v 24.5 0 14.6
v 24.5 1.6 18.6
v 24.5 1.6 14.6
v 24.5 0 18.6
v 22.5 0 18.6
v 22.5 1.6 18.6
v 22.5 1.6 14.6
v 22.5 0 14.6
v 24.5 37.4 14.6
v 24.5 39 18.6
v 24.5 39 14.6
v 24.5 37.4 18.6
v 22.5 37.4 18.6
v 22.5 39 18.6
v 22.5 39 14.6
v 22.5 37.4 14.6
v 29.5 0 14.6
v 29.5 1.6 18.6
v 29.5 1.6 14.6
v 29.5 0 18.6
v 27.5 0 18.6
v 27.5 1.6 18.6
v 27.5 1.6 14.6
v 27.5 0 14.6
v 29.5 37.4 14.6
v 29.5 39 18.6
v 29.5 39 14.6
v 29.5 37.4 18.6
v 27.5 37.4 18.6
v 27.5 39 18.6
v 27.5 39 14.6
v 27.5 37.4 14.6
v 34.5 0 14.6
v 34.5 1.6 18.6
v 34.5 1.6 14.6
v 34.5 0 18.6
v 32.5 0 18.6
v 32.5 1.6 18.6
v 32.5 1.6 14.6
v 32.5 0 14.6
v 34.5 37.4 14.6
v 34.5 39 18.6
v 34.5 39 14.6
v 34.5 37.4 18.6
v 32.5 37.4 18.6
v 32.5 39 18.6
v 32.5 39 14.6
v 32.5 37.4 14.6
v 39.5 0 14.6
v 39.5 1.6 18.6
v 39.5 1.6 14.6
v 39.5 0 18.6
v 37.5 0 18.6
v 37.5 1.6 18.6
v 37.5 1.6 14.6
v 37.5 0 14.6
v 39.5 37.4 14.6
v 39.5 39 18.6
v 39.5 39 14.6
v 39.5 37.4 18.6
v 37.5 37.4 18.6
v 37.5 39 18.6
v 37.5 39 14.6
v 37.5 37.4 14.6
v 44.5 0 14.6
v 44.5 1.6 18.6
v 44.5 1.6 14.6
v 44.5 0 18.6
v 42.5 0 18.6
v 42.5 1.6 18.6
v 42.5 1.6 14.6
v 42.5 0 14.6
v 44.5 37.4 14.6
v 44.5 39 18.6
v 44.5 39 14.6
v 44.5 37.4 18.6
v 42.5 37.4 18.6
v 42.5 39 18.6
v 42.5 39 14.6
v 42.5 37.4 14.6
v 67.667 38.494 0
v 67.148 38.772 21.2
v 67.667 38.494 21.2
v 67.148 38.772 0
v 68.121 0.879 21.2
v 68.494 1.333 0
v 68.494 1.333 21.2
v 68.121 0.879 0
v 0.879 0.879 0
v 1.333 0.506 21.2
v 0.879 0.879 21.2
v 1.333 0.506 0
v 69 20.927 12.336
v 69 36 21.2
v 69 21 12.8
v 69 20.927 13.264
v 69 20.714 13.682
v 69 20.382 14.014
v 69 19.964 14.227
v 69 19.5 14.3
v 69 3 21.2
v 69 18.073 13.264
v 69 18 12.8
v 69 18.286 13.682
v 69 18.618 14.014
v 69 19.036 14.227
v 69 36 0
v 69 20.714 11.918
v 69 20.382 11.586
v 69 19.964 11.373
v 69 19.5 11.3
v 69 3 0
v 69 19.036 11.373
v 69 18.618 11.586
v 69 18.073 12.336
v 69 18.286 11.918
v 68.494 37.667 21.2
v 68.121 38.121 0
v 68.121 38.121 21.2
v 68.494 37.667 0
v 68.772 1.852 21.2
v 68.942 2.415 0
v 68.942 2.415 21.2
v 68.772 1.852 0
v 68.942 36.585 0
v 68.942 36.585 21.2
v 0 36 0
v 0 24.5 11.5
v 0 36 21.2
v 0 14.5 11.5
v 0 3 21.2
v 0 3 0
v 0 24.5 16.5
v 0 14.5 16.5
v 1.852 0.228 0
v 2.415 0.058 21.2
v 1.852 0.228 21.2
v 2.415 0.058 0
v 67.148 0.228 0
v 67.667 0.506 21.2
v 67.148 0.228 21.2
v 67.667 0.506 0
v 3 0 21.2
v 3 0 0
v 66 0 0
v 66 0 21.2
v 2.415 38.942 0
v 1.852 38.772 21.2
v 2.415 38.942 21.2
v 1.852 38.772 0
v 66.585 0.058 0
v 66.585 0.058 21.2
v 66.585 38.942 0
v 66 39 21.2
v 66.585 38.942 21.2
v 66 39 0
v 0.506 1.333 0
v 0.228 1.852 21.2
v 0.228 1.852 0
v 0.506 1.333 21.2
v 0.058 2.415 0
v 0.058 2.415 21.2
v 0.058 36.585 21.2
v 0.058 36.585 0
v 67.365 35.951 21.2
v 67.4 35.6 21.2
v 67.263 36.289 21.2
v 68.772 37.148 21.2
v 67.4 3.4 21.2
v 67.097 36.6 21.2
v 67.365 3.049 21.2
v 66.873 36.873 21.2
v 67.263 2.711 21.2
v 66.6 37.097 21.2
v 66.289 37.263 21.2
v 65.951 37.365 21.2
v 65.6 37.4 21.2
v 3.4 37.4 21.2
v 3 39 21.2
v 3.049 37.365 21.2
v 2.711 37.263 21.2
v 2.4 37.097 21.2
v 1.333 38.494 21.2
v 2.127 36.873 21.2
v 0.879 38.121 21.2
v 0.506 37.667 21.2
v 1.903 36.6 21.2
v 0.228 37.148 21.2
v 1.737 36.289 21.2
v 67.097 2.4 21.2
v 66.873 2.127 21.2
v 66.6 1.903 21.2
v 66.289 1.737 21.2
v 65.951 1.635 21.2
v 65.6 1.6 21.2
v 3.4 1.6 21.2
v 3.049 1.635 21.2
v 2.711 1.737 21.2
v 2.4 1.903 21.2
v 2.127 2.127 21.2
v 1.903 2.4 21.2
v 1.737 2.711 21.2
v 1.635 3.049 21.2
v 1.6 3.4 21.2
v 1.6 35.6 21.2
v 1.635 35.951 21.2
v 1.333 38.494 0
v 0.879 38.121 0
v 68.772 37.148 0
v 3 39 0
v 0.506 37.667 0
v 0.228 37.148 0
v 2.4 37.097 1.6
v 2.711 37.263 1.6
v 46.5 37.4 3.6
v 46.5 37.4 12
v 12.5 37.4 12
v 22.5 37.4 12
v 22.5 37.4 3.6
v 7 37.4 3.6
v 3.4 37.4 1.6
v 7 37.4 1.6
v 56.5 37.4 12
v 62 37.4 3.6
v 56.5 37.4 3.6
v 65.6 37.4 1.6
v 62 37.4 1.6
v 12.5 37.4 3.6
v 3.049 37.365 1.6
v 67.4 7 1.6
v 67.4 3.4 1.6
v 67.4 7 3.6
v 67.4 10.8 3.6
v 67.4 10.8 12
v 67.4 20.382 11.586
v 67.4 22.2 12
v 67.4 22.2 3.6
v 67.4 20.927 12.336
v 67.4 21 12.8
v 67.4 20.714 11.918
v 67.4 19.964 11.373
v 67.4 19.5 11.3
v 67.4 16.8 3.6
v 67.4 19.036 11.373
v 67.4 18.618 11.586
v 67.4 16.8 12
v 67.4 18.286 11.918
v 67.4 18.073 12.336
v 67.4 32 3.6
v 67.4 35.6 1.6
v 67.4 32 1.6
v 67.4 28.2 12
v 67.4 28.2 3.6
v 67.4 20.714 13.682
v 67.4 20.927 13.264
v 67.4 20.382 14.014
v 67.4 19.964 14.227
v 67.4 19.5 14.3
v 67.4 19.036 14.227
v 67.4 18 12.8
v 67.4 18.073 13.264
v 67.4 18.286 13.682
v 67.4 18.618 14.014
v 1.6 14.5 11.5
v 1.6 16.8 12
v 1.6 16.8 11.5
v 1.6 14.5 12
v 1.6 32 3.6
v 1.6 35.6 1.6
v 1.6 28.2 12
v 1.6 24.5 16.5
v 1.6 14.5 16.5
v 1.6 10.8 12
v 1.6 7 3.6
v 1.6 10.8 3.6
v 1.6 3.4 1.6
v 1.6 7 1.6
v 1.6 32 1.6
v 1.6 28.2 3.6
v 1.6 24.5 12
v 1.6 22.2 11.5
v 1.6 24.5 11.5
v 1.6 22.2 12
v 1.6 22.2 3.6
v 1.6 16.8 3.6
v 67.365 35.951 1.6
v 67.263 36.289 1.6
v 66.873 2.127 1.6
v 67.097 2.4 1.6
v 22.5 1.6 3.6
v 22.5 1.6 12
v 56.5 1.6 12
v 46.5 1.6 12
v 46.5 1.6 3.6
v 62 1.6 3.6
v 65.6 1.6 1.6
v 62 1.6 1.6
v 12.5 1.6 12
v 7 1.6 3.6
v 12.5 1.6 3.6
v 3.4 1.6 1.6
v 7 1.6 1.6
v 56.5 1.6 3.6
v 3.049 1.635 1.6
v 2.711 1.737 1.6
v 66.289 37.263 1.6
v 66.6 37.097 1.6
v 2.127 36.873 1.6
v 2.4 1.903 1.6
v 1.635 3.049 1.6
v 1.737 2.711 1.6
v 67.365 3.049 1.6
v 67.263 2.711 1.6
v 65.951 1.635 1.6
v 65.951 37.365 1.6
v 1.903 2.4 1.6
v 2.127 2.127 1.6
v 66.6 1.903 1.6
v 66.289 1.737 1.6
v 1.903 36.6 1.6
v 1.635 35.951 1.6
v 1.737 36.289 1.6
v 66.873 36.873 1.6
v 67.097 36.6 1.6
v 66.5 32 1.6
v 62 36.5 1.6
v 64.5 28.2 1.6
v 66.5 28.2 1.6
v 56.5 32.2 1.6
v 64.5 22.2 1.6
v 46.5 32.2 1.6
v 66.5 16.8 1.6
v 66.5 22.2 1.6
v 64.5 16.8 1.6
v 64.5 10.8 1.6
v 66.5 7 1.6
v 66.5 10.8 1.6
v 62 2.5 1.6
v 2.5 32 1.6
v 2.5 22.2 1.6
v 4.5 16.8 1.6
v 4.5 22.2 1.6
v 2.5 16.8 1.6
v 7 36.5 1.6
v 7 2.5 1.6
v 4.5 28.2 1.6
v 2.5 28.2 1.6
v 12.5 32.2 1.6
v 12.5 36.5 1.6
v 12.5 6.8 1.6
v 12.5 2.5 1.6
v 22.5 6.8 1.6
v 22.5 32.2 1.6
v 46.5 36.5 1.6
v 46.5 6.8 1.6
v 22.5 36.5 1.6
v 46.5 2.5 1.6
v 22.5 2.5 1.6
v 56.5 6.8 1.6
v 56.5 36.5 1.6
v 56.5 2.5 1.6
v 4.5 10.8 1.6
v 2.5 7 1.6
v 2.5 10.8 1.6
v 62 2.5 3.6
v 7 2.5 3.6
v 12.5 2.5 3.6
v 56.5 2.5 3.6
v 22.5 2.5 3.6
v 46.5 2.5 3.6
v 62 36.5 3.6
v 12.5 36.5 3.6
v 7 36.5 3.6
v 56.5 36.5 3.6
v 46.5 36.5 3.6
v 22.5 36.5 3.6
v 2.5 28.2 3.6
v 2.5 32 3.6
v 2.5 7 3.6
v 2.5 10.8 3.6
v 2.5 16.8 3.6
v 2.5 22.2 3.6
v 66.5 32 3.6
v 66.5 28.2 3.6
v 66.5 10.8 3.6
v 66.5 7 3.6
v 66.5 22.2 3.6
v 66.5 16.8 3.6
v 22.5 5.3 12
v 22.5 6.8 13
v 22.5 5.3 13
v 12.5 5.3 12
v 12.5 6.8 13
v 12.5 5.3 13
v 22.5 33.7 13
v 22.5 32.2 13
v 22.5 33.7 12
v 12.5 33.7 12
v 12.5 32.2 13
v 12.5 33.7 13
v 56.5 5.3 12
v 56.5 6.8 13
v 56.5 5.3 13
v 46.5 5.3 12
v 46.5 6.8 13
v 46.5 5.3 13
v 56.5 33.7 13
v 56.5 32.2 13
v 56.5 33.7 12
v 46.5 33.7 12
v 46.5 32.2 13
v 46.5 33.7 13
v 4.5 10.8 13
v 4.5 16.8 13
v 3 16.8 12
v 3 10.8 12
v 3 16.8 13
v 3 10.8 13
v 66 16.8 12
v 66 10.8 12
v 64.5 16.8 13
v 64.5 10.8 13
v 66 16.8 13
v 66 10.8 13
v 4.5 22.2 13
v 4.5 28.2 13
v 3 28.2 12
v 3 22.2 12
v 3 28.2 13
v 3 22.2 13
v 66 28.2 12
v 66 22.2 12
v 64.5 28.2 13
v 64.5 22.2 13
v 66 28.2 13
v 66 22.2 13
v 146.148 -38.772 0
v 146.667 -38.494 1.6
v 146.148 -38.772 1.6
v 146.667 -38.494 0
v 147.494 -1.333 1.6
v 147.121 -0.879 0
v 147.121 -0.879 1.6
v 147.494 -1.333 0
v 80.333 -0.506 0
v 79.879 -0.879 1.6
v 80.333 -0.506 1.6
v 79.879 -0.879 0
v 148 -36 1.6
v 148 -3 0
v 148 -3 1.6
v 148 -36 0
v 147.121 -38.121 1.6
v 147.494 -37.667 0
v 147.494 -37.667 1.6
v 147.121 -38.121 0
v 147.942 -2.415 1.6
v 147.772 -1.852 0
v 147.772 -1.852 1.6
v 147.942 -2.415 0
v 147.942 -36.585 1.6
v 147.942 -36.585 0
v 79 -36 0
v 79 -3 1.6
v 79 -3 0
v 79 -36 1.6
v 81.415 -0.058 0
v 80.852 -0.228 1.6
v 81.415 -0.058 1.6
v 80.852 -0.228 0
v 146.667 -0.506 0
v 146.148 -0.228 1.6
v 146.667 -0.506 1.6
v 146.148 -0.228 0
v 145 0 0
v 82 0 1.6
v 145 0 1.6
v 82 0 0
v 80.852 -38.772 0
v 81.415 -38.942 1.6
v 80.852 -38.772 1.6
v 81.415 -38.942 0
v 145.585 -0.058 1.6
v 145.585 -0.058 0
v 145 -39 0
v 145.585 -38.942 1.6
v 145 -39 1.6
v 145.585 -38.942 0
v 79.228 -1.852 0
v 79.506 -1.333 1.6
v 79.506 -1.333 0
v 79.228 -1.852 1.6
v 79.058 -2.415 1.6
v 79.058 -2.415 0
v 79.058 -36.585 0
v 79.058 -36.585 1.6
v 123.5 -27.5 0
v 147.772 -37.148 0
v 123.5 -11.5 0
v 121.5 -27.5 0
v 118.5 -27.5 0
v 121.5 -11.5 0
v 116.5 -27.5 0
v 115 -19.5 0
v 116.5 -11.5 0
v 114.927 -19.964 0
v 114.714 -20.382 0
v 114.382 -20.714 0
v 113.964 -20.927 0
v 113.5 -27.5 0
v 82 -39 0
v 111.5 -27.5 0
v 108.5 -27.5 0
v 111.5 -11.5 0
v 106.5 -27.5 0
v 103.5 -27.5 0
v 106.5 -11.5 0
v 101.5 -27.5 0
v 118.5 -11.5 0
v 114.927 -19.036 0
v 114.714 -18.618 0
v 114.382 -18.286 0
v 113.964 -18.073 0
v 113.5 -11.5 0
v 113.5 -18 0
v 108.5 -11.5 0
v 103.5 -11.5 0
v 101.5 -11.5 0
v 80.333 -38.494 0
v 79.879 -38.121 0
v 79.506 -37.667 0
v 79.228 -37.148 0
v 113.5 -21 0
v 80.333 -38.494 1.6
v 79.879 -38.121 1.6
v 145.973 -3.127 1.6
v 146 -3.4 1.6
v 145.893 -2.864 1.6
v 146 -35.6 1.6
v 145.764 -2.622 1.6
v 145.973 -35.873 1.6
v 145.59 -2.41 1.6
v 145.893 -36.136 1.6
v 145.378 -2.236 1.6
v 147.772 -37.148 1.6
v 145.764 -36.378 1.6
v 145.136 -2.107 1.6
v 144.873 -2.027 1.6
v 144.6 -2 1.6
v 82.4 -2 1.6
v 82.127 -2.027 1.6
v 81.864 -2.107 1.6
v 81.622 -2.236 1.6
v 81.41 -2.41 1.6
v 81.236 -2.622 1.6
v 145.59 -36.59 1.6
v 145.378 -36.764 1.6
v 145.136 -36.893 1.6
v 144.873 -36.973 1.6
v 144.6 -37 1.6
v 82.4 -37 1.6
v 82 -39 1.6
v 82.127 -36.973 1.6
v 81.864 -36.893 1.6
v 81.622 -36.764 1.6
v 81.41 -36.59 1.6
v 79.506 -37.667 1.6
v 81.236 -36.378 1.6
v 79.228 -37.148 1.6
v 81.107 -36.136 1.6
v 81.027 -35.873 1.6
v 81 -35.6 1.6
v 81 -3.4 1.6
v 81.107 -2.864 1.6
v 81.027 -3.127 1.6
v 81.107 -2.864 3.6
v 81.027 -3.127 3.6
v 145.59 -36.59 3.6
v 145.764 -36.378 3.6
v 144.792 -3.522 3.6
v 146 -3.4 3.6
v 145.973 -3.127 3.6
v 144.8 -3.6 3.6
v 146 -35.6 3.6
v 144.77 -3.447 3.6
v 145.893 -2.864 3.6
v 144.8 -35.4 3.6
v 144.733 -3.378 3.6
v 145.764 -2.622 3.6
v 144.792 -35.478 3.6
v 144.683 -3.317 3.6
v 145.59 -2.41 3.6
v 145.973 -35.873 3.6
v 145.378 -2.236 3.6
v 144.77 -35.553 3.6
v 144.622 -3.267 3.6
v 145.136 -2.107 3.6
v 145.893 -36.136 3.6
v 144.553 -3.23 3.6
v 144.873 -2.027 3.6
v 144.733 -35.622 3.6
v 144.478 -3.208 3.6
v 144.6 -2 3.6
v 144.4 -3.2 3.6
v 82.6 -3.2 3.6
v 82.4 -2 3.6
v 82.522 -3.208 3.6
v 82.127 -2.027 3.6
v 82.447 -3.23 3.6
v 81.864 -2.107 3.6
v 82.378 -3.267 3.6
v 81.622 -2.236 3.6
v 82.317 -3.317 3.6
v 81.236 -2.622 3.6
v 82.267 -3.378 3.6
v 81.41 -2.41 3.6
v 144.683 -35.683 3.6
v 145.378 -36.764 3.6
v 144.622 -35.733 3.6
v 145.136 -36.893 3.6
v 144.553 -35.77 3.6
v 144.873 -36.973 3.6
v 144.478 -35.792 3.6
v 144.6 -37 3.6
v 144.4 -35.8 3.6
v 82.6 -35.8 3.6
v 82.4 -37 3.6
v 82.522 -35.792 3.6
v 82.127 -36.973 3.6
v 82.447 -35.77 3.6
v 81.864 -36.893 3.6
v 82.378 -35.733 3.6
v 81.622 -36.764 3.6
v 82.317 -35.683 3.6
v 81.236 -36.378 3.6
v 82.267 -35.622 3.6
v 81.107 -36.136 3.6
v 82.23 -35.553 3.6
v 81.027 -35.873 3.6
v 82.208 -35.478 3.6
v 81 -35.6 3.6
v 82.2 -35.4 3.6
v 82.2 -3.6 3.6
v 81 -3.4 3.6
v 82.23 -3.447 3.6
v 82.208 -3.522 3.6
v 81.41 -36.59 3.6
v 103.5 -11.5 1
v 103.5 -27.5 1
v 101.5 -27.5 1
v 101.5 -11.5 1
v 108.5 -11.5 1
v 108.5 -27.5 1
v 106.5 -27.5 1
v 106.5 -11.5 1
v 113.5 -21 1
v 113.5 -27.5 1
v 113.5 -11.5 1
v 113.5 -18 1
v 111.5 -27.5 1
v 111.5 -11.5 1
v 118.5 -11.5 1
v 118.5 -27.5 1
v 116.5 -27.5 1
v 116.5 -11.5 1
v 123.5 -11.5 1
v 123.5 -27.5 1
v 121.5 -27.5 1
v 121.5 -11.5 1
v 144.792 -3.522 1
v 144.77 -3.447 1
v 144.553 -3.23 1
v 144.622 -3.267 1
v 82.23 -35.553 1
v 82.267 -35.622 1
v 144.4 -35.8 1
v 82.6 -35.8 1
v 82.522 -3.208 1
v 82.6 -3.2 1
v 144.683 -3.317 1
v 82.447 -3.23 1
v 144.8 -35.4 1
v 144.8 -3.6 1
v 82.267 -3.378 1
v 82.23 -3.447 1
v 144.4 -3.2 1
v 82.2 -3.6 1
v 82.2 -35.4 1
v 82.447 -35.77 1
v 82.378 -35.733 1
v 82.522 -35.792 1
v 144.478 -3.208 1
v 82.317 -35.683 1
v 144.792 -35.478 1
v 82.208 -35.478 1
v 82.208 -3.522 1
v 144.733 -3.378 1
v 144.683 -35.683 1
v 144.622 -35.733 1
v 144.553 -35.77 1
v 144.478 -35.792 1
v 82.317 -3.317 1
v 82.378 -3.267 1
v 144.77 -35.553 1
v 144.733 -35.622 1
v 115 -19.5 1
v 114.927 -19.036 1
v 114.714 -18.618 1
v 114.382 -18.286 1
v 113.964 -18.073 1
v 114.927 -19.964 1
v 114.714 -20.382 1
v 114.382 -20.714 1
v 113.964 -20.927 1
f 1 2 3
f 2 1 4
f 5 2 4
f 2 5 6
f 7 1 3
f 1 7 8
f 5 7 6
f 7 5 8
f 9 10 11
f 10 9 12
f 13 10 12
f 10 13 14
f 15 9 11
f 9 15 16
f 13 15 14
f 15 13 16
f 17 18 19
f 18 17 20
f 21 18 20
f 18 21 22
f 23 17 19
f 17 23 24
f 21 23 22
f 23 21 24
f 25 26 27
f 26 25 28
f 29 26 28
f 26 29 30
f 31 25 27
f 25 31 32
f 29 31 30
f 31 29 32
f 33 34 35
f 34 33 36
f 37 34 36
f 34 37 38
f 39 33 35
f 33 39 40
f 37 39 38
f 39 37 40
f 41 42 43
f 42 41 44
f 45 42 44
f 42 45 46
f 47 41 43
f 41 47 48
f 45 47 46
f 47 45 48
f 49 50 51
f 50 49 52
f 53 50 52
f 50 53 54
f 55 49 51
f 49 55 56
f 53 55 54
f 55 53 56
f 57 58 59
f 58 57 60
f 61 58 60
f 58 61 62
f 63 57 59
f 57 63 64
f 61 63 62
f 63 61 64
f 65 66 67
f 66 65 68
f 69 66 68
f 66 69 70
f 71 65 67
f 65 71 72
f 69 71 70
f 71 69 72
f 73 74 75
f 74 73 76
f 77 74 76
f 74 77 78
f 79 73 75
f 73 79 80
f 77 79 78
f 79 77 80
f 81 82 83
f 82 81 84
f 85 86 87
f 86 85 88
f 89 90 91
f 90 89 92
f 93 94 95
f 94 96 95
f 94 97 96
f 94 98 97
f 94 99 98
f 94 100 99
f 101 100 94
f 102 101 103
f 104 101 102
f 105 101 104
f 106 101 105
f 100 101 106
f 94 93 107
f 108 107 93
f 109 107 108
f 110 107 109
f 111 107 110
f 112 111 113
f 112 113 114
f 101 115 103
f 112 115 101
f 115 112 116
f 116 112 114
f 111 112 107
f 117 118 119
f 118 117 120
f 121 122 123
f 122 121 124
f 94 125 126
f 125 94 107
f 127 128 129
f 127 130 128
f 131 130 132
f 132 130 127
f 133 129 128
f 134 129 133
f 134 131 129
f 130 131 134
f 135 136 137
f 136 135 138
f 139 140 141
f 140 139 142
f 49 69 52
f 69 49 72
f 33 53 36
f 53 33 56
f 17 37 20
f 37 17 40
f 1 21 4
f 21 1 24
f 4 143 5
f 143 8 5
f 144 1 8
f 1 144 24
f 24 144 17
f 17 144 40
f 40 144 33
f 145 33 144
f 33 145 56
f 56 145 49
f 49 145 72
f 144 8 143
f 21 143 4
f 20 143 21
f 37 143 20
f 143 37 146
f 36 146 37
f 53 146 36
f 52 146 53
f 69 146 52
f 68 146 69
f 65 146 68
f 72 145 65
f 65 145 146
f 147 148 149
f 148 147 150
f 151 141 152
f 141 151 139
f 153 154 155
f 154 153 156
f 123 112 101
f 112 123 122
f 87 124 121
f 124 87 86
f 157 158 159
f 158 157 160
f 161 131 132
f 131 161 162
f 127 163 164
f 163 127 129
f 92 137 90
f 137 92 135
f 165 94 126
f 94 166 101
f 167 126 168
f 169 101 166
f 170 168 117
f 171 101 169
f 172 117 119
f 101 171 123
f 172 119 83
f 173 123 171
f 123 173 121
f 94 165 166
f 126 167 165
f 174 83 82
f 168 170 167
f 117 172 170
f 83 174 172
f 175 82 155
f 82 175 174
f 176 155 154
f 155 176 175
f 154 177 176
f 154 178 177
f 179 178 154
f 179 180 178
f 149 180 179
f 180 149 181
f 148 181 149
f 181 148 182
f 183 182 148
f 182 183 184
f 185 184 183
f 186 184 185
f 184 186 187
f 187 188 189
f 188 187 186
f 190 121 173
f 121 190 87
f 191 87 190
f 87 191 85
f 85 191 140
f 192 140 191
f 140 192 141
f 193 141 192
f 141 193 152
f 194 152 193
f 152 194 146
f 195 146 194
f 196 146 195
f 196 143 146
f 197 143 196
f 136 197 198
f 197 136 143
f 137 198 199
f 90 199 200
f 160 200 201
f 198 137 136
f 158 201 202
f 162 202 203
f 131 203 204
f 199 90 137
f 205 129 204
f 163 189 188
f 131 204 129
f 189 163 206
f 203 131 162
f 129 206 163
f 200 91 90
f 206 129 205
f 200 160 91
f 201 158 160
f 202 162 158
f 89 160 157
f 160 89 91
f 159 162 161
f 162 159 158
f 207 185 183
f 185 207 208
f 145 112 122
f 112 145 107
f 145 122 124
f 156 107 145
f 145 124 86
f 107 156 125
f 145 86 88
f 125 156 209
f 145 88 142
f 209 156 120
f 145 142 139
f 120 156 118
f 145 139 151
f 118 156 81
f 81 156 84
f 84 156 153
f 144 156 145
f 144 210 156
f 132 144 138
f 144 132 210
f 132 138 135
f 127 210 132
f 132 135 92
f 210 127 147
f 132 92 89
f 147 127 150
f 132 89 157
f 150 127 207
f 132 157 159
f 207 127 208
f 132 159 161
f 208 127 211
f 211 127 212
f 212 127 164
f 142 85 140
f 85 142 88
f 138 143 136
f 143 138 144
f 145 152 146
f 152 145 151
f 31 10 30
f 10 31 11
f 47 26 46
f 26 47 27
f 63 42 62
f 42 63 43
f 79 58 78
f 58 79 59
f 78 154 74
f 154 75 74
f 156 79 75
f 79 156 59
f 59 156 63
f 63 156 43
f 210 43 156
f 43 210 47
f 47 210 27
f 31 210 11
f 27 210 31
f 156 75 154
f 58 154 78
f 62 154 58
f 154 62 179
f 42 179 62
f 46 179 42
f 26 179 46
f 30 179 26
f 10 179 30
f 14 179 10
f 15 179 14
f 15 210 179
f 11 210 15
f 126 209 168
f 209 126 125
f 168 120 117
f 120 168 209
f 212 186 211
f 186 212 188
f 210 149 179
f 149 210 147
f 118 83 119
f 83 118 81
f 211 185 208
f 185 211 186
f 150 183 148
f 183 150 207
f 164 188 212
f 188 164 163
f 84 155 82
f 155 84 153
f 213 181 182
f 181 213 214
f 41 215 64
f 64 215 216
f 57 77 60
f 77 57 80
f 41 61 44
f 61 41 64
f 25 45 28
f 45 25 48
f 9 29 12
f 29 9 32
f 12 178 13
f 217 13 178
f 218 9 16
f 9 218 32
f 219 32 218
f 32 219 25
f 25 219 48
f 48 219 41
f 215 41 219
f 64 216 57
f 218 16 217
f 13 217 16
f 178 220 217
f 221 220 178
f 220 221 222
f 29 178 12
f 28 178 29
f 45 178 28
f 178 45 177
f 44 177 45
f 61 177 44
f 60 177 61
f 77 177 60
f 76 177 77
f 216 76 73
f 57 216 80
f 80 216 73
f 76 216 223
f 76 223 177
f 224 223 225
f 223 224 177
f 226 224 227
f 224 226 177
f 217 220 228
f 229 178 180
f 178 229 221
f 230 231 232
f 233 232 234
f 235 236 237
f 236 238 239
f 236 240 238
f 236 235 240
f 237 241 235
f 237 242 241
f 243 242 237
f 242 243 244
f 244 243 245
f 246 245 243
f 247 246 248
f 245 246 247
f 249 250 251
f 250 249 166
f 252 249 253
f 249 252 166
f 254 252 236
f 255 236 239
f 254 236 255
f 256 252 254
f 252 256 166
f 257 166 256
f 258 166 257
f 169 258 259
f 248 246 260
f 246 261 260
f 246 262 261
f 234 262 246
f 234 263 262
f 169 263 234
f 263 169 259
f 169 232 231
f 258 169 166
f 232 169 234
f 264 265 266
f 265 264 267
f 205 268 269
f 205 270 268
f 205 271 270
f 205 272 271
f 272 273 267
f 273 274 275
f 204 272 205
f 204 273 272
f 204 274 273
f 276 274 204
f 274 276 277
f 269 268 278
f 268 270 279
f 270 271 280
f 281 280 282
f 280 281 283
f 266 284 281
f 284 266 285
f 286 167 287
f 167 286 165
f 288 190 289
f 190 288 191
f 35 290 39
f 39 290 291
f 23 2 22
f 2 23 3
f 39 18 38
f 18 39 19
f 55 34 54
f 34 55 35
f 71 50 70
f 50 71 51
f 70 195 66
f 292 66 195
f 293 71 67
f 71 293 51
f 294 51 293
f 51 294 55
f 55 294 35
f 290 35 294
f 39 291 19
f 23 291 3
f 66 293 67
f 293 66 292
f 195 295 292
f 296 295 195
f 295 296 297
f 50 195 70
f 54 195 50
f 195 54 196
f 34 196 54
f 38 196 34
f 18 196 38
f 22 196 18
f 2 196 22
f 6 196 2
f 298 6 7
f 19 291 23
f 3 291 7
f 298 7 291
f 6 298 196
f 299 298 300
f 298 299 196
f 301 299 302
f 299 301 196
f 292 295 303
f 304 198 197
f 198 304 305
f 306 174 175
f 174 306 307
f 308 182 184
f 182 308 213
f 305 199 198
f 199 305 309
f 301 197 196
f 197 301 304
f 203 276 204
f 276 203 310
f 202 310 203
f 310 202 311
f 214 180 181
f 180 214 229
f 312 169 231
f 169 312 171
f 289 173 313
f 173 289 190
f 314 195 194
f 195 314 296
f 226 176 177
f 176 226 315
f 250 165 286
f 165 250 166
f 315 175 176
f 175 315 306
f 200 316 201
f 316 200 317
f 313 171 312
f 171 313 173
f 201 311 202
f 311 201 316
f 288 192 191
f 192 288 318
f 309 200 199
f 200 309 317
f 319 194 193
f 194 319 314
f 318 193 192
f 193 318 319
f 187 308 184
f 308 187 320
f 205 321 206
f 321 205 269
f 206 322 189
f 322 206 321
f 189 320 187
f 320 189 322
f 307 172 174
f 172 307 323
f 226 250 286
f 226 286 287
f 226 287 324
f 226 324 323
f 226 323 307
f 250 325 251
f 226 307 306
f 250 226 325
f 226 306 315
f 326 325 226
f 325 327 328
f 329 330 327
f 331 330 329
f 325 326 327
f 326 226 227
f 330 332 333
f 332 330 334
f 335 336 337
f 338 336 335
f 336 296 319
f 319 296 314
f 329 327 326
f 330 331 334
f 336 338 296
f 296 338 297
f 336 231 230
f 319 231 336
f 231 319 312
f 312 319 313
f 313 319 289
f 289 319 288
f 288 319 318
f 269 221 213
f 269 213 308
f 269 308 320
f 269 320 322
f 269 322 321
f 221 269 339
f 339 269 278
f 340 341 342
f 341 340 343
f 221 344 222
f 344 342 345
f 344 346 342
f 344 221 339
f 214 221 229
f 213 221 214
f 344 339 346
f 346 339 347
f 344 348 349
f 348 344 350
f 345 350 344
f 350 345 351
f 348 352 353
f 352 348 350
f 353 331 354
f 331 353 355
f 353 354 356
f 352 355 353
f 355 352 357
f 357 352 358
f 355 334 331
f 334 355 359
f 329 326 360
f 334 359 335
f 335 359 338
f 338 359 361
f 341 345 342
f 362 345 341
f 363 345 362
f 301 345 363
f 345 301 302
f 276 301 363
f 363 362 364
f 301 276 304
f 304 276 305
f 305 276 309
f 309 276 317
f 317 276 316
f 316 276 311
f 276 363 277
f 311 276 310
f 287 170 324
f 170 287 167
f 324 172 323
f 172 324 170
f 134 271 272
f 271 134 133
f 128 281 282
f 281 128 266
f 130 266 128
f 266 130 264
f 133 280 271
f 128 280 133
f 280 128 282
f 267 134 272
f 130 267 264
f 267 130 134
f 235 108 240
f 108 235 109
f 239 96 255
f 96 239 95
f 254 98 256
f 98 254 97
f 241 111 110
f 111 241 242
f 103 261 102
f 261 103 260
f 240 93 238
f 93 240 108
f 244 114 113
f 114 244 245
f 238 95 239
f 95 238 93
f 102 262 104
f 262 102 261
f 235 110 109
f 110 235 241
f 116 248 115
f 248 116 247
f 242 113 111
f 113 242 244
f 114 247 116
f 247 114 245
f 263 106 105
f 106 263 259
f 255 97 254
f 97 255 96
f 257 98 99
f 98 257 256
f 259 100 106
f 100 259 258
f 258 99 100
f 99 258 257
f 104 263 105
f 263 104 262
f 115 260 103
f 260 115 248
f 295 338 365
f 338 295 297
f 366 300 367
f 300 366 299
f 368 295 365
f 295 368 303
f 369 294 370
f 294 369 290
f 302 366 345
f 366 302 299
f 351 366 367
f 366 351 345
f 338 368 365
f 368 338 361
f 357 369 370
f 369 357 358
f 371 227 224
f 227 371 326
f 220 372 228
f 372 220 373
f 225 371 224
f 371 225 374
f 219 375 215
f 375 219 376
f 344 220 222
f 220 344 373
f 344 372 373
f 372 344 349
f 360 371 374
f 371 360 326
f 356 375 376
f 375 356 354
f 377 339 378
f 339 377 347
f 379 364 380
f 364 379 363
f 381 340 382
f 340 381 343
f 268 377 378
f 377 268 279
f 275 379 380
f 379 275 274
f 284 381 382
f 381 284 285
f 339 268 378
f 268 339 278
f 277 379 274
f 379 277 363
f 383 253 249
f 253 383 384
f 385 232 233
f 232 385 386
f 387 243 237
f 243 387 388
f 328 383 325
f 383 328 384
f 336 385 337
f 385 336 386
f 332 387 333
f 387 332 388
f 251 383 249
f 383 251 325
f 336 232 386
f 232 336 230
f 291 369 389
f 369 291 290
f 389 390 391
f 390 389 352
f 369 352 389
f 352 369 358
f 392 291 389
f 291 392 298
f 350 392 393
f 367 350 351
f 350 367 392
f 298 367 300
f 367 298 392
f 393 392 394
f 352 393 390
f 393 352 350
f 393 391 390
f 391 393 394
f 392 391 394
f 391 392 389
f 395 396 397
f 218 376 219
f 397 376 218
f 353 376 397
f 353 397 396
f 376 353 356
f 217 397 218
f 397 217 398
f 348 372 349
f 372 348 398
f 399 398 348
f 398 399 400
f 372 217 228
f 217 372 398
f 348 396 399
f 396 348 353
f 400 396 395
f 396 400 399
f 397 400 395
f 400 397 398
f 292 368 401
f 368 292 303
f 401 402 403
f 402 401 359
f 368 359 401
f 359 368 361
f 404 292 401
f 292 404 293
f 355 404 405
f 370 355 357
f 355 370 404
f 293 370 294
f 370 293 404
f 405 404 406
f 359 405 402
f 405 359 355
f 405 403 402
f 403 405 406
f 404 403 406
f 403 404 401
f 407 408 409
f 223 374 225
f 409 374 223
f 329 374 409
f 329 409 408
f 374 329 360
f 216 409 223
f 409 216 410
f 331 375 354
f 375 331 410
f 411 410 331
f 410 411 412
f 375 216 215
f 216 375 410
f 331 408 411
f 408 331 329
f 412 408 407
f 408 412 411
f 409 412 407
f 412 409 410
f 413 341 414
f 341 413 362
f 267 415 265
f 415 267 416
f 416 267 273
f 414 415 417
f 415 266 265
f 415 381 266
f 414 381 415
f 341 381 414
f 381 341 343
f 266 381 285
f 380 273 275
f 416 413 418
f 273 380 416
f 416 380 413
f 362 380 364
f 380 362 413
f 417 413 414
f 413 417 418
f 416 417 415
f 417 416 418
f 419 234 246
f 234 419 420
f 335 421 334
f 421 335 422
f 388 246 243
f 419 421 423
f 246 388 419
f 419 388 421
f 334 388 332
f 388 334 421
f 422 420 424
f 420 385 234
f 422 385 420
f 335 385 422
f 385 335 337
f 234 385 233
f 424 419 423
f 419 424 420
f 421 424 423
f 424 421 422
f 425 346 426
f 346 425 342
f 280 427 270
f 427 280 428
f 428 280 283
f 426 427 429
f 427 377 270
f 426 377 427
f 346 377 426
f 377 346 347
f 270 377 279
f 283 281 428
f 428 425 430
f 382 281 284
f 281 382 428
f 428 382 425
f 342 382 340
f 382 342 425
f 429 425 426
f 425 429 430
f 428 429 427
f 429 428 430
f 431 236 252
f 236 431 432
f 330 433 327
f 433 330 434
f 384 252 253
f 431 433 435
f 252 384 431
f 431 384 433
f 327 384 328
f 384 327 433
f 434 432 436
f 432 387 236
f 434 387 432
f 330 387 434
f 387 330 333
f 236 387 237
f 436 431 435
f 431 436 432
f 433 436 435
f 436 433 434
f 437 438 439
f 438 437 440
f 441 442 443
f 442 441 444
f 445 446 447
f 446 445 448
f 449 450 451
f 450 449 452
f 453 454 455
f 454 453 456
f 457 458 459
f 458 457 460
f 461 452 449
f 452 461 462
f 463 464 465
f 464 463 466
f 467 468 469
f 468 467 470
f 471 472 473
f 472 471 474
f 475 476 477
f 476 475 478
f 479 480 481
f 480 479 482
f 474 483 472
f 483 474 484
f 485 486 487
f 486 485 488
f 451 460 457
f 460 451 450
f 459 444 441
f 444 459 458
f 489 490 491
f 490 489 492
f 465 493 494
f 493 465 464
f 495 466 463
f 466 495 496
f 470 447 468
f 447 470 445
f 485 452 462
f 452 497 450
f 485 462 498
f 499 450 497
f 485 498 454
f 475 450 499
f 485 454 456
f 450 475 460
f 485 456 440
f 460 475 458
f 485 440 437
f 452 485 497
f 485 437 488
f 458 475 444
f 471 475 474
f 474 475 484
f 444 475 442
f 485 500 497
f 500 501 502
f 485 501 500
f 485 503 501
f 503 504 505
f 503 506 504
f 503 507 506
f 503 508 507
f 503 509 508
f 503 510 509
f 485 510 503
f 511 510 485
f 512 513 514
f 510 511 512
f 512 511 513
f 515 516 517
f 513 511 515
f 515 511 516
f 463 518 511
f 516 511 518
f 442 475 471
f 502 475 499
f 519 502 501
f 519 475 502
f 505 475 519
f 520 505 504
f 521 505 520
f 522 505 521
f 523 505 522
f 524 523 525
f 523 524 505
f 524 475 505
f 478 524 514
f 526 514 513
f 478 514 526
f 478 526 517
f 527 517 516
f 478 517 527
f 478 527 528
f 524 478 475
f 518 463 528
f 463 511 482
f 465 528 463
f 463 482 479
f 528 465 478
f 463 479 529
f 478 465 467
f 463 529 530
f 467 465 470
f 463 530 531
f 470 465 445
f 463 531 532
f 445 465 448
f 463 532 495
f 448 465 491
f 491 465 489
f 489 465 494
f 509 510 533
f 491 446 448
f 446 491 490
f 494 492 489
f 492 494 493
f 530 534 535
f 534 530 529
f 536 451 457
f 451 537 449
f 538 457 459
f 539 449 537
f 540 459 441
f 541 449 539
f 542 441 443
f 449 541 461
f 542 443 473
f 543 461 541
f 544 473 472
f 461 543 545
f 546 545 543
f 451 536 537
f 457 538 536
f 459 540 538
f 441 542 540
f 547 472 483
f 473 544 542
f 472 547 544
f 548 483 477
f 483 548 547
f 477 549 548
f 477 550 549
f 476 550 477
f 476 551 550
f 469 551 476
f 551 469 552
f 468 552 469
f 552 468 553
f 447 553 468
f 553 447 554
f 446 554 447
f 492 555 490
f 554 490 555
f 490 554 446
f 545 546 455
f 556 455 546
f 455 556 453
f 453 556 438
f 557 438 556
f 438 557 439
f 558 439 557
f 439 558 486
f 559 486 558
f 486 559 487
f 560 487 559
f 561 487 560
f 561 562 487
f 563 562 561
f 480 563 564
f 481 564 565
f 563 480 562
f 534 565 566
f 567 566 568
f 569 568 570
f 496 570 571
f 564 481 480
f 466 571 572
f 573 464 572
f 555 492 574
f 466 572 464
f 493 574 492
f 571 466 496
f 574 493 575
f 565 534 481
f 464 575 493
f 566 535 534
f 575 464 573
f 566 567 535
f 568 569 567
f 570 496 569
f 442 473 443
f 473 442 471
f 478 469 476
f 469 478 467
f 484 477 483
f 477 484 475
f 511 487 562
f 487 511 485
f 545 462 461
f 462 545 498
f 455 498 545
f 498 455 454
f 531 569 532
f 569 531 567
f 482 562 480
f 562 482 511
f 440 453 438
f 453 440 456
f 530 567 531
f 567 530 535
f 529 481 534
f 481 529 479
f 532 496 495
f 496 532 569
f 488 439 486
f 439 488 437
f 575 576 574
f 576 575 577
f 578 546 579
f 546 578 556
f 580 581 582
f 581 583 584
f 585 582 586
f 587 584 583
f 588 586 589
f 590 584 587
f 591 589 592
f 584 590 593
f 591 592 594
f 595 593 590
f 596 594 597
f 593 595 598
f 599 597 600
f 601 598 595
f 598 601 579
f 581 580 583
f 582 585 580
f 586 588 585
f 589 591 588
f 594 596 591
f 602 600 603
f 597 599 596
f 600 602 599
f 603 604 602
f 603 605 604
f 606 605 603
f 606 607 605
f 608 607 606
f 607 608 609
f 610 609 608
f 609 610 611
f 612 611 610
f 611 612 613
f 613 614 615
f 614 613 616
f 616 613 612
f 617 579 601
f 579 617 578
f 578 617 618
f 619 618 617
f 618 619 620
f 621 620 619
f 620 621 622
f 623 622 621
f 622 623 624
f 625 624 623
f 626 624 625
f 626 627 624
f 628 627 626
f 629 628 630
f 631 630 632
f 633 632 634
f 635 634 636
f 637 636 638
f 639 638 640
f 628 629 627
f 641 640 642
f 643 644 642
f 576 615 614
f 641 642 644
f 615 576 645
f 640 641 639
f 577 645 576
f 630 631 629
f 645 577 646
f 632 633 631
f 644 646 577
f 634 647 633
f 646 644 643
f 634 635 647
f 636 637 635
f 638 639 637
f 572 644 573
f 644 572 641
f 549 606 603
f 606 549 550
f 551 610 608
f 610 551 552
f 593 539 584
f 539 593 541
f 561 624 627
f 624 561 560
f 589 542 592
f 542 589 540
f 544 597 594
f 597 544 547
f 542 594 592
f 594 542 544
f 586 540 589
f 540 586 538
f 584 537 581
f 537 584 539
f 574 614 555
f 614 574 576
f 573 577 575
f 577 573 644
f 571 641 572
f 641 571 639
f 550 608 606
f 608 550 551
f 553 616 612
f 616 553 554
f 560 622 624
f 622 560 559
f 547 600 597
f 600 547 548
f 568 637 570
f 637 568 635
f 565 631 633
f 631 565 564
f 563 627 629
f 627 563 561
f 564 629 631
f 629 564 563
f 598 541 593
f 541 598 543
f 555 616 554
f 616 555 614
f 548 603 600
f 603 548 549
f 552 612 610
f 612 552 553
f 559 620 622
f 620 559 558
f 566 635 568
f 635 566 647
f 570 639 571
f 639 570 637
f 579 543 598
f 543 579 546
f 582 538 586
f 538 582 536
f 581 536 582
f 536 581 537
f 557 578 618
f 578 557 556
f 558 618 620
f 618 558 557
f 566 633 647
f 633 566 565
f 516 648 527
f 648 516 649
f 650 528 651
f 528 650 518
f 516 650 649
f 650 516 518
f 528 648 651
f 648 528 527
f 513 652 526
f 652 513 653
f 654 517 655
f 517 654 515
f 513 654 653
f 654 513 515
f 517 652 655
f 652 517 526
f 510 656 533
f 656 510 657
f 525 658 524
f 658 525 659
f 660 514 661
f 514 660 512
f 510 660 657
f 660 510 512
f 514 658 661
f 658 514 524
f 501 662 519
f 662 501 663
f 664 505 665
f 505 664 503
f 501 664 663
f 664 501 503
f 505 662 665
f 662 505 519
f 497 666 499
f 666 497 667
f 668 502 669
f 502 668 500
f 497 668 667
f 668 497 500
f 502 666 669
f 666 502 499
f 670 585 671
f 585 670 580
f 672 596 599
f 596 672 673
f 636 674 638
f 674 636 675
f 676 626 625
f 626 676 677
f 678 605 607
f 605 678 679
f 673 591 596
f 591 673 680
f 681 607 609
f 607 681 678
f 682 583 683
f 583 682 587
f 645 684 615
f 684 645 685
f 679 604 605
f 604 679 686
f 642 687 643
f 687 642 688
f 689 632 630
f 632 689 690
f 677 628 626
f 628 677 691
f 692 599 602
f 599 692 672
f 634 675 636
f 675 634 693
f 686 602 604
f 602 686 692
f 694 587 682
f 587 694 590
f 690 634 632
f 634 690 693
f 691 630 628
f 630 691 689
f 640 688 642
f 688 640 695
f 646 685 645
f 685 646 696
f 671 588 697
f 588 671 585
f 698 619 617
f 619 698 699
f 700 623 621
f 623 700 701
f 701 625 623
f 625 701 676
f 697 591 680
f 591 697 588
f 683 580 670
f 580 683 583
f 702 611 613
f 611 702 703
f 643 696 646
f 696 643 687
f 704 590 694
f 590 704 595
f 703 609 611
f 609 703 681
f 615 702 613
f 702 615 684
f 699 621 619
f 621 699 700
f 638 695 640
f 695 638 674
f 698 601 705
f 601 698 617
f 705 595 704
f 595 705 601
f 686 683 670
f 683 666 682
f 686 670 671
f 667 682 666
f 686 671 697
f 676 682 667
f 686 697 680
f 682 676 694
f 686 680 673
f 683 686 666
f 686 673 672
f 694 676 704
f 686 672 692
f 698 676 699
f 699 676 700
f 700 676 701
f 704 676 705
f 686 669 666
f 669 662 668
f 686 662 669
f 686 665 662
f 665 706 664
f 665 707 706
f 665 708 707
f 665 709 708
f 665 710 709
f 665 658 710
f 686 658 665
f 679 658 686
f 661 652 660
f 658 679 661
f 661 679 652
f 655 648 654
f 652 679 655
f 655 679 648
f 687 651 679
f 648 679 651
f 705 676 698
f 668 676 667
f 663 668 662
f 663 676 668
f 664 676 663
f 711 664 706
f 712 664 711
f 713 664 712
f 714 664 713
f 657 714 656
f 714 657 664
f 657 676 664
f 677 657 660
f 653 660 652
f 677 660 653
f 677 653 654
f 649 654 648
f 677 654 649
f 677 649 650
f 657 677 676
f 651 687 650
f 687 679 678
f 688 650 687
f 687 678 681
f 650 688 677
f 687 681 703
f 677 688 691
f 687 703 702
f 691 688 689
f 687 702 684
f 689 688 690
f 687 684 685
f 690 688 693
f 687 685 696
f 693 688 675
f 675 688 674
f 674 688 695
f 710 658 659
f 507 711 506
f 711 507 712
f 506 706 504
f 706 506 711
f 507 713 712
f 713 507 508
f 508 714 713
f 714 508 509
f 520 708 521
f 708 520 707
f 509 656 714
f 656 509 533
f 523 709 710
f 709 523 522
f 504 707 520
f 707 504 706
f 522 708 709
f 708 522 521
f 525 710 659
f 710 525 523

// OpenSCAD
// NerdMiner FireBeetle 2 ESP32-E Case with Battery
// Battery: 65x35x10mm LiPo pouch (3000mAh)
// Board: DFRobot FireBeetle 2 ESP32-E (60x25.4mm)
// Layout: battery below, board on top, USB-C at front
//
// Orientation: X = long axis (68.2mm outer), Y = short axis (38.2mm outer)
// USB-C is on the X=0 short edge (front)

/* [Board Dimensions] */
board_l = 60;         // along X
board_w = 25.4;       // along Y
board_h = 1.6;
board_clearance = 6;

/* [Battery Dimensions] */
batt_l = 65;          // along X
batt_w = 35;          // along Y
batt_h = 10;

/* [Case Parameters] */
wall = 1.6;
gap = 0.4;
corner_r = 3;

/* [Computed] */
inner_l = max(batt_l, board_l) + 2*gap;  // 65.8
inner_w = max(batt_w, board_w) + 2*gap;  // 35.8

// Z stack: floor | battery | gap | PCB | components | lid
pcb_z = wall + batt_h + gap;             // top of battery + small gap
lid_z = pcb_z + board_h + board_clearance;

outer_l = inner_l + 2*wall;
outer_w = inner_w + 2*wall;
outer_h = lid_z + wall;

// Board centered in case
board_x = wall + (inner_l - board_l) / 2;
board_y = wall + (inner_w - board_w) / 2;

module rounded_box(l, w, h, r) {
    hull() {
        for (x = [r, l-r])
            for (y = [r, w-r])
                translate([x, y, 0])
                    cylinder(h=h, r=r, $fn=32);
    }
}

module base() {
    difference() {
        // Outer shell - open top
        rounded_box(outer_l, outer_w, outer_h, corner_r);

        // Hollow inside
        translate([wall, wall, wall])
            rounded_box(inner_l, inner_w, outer_h, corner_r - wall + gap);

        // USB-C cutout - front short edge (X=0 wall)
        // Centered on the board's Y position
        usb_w = 10;
        usb_h = 4;
        translate([-1, outer_w/2 - usb_w/2, pcb_z - 0.5])
            cube([wall + 2, usb_w, usb_h + 1]);

        // Ventilation slots on long sides (Y=0 and Y=outer_w walls)
        for (i = [0:4]) {
            slot_x = outer_l/2 - 12 + i*5;
            // Y=0 side
            translate([slot_x, -1, pcb_z + board_h + 1])
                cube([2, wall+2, board_clearance - 2]);
            // Y=outer_w side
            translate([slot_x, outer_w - wall - 1, pcb_z + board_h + 1])
                cube([2, wall+2, board_clearance - 2]);
        }

        // Reset button hole - back short edge (X=outer_l wall)
        translate([outer_l - wall - 1, outer_w/2, pcb_z + board_h/2])
            rotate([0, 90, 0])
                cylinder(d=3, h=wall+2, $fn=20);
    }

    // --- Battery retaining ridges on floor ---
    batt_x = wall + (inner_l - batt_l) / 2;
    batt_y = wall + (inner_w - batt_w) / 2;

    // Ridges along the long edges of battery
    for (y = [batt_y - 0.5, batt_y + batt_w - 0.5])
        translate([batt_x + 5, y, wall])
            cube([batt_l - 10, 1, 2]);

    // Ridges along the short edges of battery
    for (x = [batt_x - 0.5, batt_x + batt_l - 0.5])
        translate([x, batt_y + 5, wall])
            cube([1, batt_w - 10, 2]);

    // --- PCB support brackets ---
    // These are L-shaped brackets attached to the long walls (Y=wall and Y=wall+inner_w)
    // They extend from the wall down to the floor, then have a shelf at pcb_z
    // The board is narrower than the battery, so the brackets sit at the
    // board edge which is inboard of the wall by (inner_w - board_w)/2

    bracket_w = 2;      // bracket thickness along Y
    shelf_depth = 1.5;  // how far shelf extends under PCB

    // Two brackets per long wall, positioned along X to support the board
    for (x_pos = [board_x + 8, board_x + board_l - 18]) {
        // Near wall (Y = wall side) - bracket goes from wall to board edge
        // Vertical part: wall face down to shelf height
        translate([x_pos, wall, wall])
            cube([10, board_y - wall, pcb_z - wall]);
        // Shelf part: horizontal ledge at pcb_z for PCB to rest on
        translate([x_pos, board_y - shelf_depth, pcb_z])
            cube([10, shelf_depth, 1]);

        // Far wall (Y = wall+inner_w side)
        translate([x_pos, board_y + board_w, wall])
            cube([10, (wall + inner_w) - (board_y + board_w), pcb_z - wall]);
        // Shelf
        translate([x_pos, board_y + board_w, pcb_z])
            cube([10, shelf_depth, 1]);
    }

    // Front and back short-wall brackets (X direction)
    // These support the short edges of the PCB
    for (y_pos = [board_y + 4, board_y + board_w - 10]) {
        // Front wall (X=wall side)
        translate([wall, y_pos, wall])
            cube([board_x - wall, 6, pcb_z - wall]);
        // Shelf
        translate([board_x - shelf_depth, y_pos, pcb_z])
            cube([shelf_depth, 6, 1]);

        // Back wall (X=wall+inner_l side)
        translate([board_x + board_l, y_pos, wall])
            cube([(wall + inner_l) - (board_x + board_l), 6, pcb_z - wall]);
        // Shelf
        translate([board_x + board_l, y_pos, pcb_z])
            cube([shelf_depth, 6, 1]);
    }
}

module lid() {
    lip_depth = 2;  // how far the lip drops into the case

    difference() {
        union() {
            // Top plate
            rounded_box(outer_l, outer_w, wall, corner_r);

            // Inner lip
            translate([wall + gap, wall + gap, -lip_depth])
                rounded_box(inner_l - 2*gap, inner_w - 2*gap, lip_depth + wall, corner_r - wall);
        }

        // Hollow out the lip so it's just a rim
        translate([wall + gap + 1.2, wall + gap + 1.2, -lip_depth - 1])
            rounded_box(inner_l - 2*gap - 2.4, inner_w - 2*gap - 2.4, lip_depth + wall, corner_r - wall - 1);

        // Ventilation slots on top
        for (i = [0:4])
            translate([outer_l/2 - 12 + i*5, outer_w/2 - 8, -1])
                cube([2, 16, wall + 2]);

        // LED window
        translate([board_x + 30, outer_w/2, -1])
            cylinder(d=3, h=wall + 2, $fn=20);
    }
}

// --- Print layout ---
base();

// Lid next to base, flipped for printing
translate([outer_l + 10, 0, wall])
    rotate([180, 0, 0])
        lid();
